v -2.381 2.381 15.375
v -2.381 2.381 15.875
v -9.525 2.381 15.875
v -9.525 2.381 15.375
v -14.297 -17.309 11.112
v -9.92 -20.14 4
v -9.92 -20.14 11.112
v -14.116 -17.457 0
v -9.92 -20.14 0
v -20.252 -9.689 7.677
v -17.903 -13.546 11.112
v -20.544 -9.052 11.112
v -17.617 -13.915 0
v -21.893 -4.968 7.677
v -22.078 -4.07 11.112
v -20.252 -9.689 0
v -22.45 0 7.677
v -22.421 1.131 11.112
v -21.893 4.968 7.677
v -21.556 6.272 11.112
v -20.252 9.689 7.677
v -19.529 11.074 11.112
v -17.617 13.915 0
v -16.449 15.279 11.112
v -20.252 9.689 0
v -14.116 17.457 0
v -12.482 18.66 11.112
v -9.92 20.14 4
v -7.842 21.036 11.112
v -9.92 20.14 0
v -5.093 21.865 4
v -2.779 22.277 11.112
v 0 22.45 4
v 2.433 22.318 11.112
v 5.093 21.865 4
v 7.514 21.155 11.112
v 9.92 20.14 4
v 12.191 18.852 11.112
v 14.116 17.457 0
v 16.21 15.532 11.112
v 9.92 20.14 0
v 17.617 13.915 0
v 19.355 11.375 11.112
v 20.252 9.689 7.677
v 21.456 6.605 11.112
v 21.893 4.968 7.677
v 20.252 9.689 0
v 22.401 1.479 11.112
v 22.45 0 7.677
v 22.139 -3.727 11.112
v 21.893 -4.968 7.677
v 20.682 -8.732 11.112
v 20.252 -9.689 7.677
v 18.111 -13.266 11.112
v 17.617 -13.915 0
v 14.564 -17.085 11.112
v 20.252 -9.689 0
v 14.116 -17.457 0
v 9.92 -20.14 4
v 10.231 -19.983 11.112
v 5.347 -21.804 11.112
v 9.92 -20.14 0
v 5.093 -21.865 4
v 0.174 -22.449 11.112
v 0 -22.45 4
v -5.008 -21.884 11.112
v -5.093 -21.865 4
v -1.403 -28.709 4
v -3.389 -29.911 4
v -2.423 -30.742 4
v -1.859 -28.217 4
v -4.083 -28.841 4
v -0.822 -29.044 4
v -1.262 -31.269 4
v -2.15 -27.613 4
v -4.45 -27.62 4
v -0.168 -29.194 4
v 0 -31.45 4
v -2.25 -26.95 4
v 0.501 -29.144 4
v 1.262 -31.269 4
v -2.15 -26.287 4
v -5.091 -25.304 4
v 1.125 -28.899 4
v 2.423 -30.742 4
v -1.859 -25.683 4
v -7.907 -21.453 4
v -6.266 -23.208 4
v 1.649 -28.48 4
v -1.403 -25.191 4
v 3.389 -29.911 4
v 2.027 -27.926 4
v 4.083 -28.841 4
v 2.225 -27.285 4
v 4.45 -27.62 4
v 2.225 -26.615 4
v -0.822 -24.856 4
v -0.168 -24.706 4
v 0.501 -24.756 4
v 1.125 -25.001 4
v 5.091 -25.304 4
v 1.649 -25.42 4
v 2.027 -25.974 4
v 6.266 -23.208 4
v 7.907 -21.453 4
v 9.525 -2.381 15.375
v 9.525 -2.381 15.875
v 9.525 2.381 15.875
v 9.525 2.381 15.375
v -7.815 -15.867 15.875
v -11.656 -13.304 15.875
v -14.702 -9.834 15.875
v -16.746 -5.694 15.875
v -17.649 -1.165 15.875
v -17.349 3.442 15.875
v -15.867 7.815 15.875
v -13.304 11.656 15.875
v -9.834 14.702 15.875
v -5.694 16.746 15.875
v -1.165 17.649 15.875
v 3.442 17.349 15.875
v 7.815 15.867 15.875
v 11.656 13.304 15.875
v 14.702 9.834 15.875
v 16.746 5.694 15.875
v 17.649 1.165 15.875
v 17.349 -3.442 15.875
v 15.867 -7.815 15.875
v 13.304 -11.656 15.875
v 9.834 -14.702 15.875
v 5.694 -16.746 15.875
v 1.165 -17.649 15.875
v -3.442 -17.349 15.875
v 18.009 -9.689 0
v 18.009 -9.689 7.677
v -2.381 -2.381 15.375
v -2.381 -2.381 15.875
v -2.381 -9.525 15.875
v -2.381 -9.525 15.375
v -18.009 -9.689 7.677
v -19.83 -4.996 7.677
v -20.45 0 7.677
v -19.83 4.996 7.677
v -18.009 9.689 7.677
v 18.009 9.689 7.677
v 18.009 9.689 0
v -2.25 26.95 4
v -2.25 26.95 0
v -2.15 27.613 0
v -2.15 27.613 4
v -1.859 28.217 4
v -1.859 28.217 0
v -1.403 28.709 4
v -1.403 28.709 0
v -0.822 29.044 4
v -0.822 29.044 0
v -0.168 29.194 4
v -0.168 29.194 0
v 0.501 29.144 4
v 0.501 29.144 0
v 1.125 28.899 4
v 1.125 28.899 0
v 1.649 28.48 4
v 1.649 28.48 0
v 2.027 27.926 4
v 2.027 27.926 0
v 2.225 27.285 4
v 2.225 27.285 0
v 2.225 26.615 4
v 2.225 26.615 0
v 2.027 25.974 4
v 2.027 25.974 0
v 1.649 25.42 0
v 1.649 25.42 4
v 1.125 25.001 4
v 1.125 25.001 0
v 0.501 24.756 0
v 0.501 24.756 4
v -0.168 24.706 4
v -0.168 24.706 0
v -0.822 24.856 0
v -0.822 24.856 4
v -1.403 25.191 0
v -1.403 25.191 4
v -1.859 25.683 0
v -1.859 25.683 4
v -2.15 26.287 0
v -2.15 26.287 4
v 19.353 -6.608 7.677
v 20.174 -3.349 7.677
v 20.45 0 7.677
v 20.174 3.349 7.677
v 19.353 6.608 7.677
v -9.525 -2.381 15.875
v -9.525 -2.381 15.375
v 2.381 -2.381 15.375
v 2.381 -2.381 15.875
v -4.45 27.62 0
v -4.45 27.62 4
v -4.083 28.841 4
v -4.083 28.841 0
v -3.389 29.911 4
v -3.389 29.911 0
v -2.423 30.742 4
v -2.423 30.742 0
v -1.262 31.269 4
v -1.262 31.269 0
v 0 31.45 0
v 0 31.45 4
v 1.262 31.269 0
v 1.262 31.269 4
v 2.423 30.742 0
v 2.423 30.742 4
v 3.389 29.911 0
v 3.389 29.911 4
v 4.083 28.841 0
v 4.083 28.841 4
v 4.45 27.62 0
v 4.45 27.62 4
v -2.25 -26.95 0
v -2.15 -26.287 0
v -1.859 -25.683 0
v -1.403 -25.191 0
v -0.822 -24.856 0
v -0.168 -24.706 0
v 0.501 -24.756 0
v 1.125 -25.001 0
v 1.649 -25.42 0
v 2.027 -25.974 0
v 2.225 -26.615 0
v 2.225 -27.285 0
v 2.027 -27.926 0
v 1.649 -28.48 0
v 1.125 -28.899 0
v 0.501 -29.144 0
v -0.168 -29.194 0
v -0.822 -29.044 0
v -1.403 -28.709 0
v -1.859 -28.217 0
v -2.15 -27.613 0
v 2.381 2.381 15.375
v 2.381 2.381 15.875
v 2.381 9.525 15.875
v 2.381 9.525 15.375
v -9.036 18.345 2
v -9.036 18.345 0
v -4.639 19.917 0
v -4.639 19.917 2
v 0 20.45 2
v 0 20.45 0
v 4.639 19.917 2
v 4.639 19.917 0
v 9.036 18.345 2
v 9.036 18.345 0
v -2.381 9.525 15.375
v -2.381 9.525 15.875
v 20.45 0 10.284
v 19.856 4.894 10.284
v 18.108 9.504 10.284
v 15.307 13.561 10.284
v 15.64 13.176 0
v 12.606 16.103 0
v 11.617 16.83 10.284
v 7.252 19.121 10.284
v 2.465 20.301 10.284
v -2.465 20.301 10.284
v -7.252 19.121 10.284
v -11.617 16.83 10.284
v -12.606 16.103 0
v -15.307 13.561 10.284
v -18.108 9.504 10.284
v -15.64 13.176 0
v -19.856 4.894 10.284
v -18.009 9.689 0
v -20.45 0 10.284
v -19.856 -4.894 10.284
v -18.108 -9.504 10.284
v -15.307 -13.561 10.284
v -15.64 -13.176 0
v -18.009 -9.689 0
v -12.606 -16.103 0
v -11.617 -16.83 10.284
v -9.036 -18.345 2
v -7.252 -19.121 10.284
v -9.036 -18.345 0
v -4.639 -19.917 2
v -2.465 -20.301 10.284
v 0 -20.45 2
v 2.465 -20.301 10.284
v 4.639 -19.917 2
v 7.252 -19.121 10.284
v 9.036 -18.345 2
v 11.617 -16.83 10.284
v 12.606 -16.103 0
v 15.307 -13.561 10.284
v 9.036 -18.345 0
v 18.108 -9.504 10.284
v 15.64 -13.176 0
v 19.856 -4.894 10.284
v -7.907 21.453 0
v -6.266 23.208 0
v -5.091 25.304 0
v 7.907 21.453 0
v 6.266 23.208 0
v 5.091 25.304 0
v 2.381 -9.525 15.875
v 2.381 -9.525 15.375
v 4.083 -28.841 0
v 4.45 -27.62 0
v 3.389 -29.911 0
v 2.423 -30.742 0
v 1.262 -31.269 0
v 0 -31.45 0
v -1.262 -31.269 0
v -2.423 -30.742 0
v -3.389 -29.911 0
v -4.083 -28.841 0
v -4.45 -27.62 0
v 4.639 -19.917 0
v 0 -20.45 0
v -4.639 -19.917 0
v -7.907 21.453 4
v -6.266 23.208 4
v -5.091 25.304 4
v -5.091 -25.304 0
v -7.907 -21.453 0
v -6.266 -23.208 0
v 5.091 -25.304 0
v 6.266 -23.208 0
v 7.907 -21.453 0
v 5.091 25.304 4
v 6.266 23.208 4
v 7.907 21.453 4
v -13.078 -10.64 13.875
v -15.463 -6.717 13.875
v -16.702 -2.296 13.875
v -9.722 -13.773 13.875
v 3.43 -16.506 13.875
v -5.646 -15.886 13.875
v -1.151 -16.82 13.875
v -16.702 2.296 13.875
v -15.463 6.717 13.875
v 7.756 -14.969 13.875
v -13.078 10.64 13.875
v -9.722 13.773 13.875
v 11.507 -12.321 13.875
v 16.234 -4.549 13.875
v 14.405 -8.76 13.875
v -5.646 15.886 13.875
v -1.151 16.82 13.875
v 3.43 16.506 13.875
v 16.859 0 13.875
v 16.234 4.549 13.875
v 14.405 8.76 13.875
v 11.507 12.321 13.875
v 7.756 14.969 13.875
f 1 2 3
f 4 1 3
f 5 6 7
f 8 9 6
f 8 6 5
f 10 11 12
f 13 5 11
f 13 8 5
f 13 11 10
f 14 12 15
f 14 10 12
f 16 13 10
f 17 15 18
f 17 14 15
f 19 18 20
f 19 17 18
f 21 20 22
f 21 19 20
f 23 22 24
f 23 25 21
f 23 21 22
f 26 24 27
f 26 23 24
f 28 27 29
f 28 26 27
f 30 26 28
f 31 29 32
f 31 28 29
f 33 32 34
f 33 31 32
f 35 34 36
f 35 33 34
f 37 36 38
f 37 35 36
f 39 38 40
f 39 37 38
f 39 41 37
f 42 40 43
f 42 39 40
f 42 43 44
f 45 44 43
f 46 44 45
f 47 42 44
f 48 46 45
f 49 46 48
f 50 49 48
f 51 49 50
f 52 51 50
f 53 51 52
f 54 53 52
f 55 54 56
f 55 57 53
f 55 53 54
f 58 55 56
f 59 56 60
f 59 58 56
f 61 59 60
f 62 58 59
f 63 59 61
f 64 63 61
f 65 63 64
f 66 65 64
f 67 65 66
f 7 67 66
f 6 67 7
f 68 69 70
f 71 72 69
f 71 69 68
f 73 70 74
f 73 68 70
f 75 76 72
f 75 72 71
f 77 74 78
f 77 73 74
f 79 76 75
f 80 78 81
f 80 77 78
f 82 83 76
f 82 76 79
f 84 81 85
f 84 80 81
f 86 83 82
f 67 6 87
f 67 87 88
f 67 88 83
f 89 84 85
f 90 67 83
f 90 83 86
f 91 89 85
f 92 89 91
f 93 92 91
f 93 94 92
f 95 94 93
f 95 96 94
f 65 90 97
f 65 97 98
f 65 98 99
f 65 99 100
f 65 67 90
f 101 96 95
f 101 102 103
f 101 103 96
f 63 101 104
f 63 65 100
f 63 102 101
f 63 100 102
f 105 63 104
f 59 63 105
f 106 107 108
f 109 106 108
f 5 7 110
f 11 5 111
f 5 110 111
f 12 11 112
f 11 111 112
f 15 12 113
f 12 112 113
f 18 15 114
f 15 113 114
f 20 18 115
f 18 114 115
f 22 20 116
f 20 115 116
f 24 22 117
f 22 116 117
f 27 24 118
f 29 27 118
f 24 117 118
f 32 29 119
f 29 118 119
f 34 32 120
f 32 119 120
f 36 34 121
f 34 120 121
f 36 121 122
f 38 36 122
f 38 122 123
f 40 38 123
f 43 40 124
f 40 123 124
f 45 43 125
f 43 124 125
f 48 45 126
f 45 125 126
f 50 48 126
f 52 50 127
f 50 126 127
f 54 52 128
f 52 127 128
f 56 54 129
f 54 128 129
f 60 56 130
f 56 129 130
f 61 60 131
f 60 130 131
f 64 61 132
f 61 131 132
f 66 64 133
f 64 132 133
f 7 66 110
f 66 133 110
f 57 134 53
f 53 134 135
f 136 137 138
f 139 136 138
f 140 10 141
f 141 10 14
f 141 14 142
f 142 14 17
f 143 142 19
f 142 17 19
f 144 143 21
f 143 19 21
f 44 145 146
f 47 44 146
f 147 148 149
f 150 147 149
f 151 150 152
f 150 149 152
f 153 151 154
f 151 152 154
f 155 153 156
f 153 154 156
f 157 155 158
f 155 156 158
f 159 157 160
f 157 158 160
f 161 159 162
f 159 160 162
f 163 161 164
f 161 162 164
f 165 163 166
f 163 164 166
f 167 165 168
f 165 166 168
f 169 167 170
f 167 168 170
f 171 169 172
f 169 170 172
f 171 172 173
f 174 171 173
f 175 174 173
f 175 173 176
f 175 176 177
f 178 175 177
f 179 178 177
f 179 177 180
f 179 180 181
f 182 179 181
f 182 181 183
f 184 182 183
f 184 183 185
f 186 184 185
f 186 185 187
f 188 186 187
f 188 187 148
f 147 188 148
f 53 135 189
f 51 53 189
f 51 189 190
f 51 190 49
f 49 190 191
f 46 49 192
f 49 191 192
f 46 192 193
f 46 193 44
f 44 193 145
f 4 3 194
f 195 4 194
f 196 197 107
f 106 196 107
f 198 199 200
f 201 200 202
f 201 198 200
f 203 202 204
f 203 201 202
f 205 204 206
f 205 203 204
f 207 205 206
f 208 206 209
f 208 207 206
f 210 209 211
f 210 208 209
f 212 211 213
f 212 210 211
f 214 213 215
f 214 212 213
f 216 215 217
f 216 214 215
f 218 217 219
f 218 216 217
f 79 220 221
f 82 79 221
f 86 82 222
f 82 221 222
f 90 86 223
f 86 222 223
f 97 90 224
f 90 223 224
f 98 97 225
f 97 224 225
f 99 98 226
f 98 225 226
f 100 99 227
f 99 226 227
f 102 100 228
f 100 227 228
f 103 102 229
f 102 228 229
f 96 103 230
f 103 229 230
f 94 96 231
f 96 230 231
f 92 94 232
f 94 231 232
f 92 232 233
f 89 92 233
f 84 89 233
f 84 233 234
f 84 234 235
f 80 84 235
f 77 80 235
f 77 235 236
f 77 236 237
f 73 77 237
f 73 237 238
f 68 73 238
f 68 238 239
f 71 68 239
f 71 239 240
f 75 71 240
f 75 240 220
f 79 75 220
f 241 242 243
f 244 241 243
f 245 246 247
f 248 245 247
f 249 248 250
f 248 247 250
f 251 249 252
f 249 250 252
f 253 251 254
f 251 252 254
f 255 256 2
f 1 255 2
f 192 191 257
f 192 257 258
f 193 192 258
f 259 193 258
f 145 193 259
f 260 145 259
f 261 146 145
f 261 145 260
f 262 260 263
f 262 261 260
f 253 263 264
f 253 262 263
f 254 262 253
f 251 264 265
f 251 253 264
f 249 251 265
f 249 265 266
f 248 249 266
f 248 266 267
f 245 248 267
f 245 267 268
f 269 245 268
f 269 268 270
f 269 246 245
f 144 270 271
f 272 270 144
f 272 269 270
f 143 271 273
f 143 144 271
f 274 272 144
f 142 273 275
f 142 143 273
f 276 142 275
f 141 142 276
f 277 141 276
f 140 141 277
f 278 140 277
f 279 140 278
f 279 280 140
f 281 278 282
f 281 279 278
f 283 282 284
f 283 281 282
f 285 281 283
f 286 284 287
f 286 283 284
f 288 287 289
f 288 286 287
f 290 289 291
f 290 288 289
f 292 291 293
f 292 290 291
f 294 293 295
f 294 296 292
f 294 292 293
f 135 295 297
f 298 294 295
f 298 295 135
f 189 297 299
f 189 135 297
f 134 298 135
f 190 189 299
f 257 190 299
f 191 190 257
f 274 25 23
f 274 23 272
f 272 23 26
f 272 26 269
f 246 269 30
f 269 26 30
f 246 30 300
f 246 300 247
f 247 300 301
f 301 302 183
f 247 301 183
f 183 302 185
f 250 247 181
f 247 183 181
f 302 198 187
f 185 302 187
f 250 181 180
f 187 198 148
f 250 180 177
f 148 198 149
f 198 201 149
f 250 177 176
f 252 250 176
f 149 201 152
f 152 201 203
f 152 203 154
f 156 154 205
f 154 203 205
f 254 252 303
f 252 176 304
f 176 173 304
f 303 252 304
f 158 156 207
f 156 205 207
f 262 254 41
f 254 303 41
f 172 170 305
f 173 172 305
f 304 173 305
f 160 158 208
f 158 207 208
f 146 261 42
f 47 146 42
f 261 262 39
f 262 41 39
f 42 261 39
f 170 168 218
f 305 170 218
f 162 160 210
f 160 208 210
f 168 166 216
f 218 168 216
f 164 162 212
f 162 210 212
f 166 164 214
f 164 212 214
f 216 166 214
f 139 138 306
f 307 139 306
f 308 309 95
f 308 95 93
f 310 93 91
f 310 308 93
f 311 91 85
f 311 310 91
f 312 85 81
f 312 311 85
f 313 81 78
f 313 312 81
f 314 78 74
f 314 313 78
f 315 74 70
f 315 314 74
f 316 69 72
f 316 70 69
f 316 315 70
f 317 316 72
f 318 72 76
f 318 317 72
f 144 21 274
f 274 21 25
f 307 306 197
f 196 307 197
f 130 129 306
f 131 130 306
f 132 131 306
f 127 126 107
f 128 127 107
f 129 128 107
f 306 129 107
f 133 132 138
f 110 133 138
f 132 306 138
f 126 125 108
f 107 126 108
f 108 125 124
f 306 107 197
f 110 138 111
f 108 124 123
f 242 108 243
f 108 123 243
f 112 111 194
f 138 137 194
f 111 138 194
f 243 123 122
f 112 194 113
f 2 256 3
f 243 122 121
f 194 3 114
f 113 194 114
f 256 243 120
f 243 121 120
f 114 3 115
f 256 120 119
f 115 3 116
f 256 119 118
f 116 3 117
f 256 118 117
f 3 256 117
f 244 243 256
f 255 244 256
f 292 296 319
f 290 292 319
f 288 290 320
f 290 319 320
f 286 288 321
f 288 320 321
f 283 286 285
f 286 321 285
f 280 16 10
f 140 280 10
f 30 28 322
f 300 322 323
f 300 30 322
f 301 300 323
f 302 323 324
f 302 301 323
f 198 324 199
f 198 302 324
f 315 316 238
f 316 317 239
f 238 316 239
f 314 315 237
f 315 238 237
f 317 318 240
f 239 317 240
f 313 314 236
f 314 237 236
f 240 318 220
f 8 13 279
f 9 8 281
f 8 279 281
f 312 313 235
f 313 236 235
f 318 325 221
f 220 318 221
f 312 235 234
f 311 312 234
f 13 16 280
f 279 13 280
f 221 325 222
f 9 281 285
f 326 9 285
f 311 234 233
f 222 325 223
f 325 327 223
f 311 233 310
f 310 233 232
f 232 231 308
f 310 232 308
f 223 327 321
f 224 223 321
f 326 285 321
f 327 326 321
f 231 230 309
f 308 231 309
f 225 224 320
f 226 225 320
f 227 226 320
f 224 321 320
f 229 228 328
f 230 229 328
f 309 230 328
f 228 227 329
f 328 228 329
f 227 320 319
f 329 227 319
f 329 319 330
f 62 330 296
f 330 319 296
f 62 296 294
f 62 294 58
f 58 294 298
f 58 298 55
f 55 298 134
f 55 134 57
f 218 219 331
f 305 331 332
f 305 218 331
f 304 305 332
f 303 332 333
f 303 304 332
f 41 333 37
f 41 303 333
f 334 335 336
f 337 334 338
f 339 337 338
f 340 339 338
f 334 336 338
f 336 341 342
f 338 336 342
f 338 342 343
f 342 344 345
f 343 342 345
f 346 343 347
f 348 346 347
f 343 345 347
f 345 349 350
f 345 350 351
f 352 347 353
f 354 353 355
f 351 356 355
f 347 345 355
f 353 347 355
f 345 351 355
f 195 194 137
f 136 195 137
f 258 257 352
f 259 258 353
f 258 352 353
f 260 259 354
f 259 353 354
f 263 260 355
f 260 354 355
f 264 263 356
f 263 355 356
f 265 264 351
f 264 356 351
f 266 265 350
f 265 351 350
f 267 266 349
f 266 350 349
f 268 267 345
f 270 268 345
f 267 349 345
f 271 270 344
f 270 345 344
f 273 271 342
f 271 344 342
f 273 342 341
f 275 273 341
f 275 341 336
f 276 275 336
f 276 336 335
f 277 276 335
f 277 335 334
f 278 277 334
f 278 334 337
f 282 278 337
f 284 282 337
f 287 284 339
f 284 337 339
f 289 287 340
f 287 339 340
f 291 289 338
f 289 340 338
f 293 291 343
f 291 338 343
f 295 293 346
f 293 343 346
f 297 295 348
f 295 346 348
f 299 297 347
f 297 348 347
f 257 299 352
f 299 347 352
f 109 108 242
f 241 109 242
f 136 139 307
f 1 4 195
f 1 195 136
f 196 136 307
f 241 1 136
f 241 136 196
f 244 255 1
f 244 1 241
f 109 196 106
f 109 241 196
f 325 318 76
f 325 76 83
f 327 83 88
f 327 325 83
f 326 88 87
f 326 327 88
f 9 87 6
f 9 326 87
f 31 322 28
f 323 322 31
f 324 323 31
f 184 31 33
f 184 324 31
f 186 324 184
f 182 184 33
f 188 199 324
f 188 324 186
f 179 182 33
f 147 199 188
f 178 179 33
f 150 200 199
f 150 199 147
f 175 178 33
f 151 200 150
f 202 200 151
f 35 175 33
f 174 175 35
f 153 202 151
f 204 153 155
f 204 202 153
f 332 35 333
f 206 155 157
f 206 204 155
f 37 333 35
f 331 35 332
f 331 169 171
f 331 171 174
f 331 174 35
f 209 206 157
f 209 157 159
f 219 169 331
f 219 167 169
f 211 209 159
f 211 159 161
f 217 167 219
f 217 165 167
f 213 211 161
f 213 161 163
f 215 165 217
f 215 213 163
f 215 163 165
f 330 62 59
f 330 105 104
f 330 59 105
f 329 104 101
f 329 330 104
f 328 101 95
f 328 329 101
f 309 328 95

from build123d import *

# Parameters (mm, degrees)
SKETCH1_R               = 20.450000000000003
BOSS_EXTRUDE1_DEPTH     = 15.875
CUT_EXTRUDE2_START      = -11.875
CUT_EXTRUDE2_DEPTH      = 11.875
M4_CLEARANCE_HOLE1_D    = 4.5
CHAMFER1_SIZE           = 4.7625
SHELL1_OUTLINE_R        = 20.45
SHELL1_DEPTH            = 10.284072775
SHELL1_2_DEPTH          = 2
BOSS_EXTRUDE2_START     = 2
BOSS_EXTRUDE2_DEPTH     = 2
CUT_EXTRUDE5_DEPTH      = 0.5
CUT_EXTRUDE7_DEPTH      = 42.774640932046694
CUT_EXTRUDE7_DEPTH_BACK = 42.774640932046694


with BuildPart() as part:
    # Sketch1 → Boss-Extrude1 (new body)
    # profile 1 of 2: a face of its own
    with BuildSketch(Plane.XY):
        with BuildLine():
            ThreePointArc((-4.449768205772106, -27.620494530122933), (-6.26579346059064, -23.208178662106004), (-9.919608253272203, -20.139609532026952))
            ThreePointArc((-9.919608253272203, -20.139609532026952), (-22.449999999999612, -2.260939e-11), (-9.919608253272486, 20.139609531981904))
            ThreePointArc((-9.919608253272486, 20.139609531981904), (-6.265793460590954, 23.208178662061), (-4.449768205772483, 27.620494530077963))
            ThreePointArc((-4.449768205772483, 27.620494530077963), (1.6339e-13, 31.449999999977553), (4.449768205772869, 27.620494530078034))
            ThreePointArc((4.449768205772869, 27.620494530078034), (6.265793460591407, 23.2081786620611), (9.919608253272981, 20.139609531982046))
            ThreePointArc((9.919608253272981, 20.139609531982046), (22.4500000000004, -2.229809e-11), (9.919608253273257, -20.13960953202682))
            ThreePointArc((9.919608253273257, -20.13960953202682), (6.265793460591725, -23.20817866210592), (4.449768205773249, -27.620494530122876))
            ThreePointArc((4.449768205773249, -27.620494530122876), (5.9636e-13, -31.450000000022463), (-4.449768205772106, -27.620494530122933))
        make_face()
        Circle(SKETCH1_R, mode=Mode.SUBTRACT)
    # profile 2 of 2: a face of its own
    with BuildSketch(Plane.XY):
        Circle(SKETCH1_R)
    extrude(amount=BOSS_EXTRUDE1_DEPTH)

    # Sketch3 → Cut-Extrude2 (cut)
    with BuildSketch(Plane.XY.offset(15.875).offset(CUT_EXTRUDE2_START)):
        with BuildLine():
            ThreePointArc((-9.919608253272486, 20.139609531981908), (2.3162e-13, 22.449999999977553), (9.919608253272981, 20.13960953198205))
            ThreePointArc((9.91960825327298, 20.139609531982046), (6.2657934605914, 23.208178662061094), (4.4497682057728625, 27.620494530078037))
            ThreePointArc((4.4497682057728625, 27.620494530078037), (1.6065e-13, 31.449999999977546), (-4.449768205772477, 27.620494530077963))
            ThreePointArc((-4.449768205772479, 27.620494530077963), (-6.265793460590951, 23.208178662061), (-9.919608253272482, 20.139609531981904))
        make_face()
        with BuildLine():
            ThreePointArc((4.449768205773246, -27.62049453012288), (6.265793460591725, -23.20817866210592), (9.919608253273257, -20.13960953202682))
            ThreePointArc((9.919608253273244, -20.139609532026824), (5.4515e-13, -22.45000000002246), (-9.919608253272205, -20.139609532026956))
            ThreePointArc((-9.9196082532722, -20.139609532026952), (-6.265793460590633, -23.208178662106), (-4.449768205772095, -27.620494530122933))
            ThreePointArc((-4.4497682057720995, -27.620494530122933), (5.9608e-13, -31.450000000022456), (4.449768205773246, -27.62049453012288))
        make_face()
    extrude(amount=CUT_EXTRUDE2_DEPTH, mode=Mode.SUBTRACT)

    # M4 Clearance Hole1 (through all)
    with Locations(Plane.XY.offset(4)):
        with Locations((0, -26.95), (0, 26.95)):
            Hole(M4_CLEARANCE_HOLE1_D / 2)

    # Chamfer1
    chamfer1_edges = [part.edges().sort_by_distance(p)[0] for p in [
        (9.91960825327299, 20.139609531982046, 15.875),
    ]]
    chamfer(chamfer1_edges, length=CHAMFER1_SIZE)

    # Shell1: read off the stored shape, not the designer's step
    # Shell1 outline → Shell1 (cut)
    with BuildSketch(Plane.XY):
        Circle(SHELL1_OUTLINE_R)
    extrude(amount=SHELL1_DEPTH, mode=Mode.SUBTRACT)

    # Shell1 2 outline → Shell1 2 (cut)
    with BuildSketch(Plane.XY):
        with BuildLine():
            ThreePointArc((9.035901505, -18.345434963), (0, -20.45), (-9.035901505, -18.345434963))
            ThreePointArc((-9.035901505, -18.345434963), (-5.656595992, -20.826114024), (-3.336769132, -24.317800965))
            ThreePointArc((-3.336769132, -24.317800965), (0, -22.7), (3.336769132, -24.317800965))
            ThreePointArc((3.336769132, -24.317800965), (5.656595992, -20.826114024), (9.035901505, -18.345434963))
        make_face()
        with BuildLine():
            ThreePointArc((-3.336769132, 24.317800965), (-5.656595992, 20.826114024), (-9.035901505, 18.345434963))
            ThreePointArc((-9.035901505, 18.345434963), (0, 20.45), (9.035901505, 18.345434963))
            ThreePointArc((9.035901505, 18.345434963), (5.656595992, 20.826114024), (3.336769132, 24.317800965))
            ThreePointArc((3.336769132, 24.317800965), (0, 22.7), (-3.336769132, 24.317800965))
        make_face()
    extrude(amount=SHELL1_2_DEPTH, mode=Mode.SUBTRACT)

    # Shell1 3 outline → Shell1 3 (revolve, cut)
    with BuildSketch(Plane.XZ):
        Polygon((16.859072875, 13.875), (0, 13.875), (0, 10.284072775), (20.45, 10.284072775), align=None)
    revolve(axis=Axis((0, 0, 0), (0, 0, 1)), mode=Mode.SUBTRACT)

    # Sketch6 → Boss-Extrude2 (add)
    with BuildSketch(Plane(origin=(0, 0, 2), x_dir=(-1, 0, 0), z_dir=(0, 0, -1)).offset(BOSS_EXTRUDE2_START)):
        with BuildLine():
            ThreePointArc((9.035901504651038, -18.34543496347422), (5.656595991725949, -20.826114024149227), (3.3367691319005477, -24.3178009648972))
            ThreePointArc((3.3367691319005477, -24.3178009648972), (-5.6684e-13, -22.70000000000008), (-3.3367691319011485, -24.317800964898304))
            ThreePointArc((-3.3367691319011485, -24.317800964898304), (-5.656595991726578, -20.826114024149597), (-9.035901504652076, -18.345434963474087))
            ThreePointArc((-9.035901504652076, -18.345434963474087), (-5.3382e-13, -20.45000000002246), (9.035901504651038, -18.34543496347422))
        make_face()
        with BuildLine():
            ThreePointArc((-9.035901504651829, 18.345434963429298), (-5.65659599172108, 20.826114024110222), (-3.336769131894781, 24.31780096486728))
            ThreePointArc((-3.336769131894781, 24.31780096486728), (-2.2525e-13, 22.699999999977557), (3.336769131894348, 24.317800964867242))
            ThreePointArc((3.336769131894348, 24.317800964867242), (5.656595991720593, 20.826114024110154), (9.03590150465129, 18.345434963429177))
            ThreePointArc((9.03590150465129, 18.345434963429177), (-2.5229e-13, 20.449999999977546), (-9.035901504651829, 18.345434963429298))
        make_face()
    extrude(amount=-BOSS_EXTRUDE2_DEPTH)

    # Sketch7 → Cut-Extrude5 (cut)
    with BuildSketch(Plane.XY.offset(15.875)):
        Polygon((-2.381250000000002, 9.524999999999997), (-2.381250000000001, 2.3812500000000005), (2.3812499999999996, 2.3812500000000005), (2.3812499999999983, 9.524999999999997), align=None)
        Polygon((2.3812499999999996, 2.3812500000000005), (-2.3812500000000014, 2.3812500000000005), (-2.3812500000000005, -2.3812499999999996), (2.3812499999999996, -2.3812499999999996), align=None)
        Polygon((9.525, 2.3812500000000005), (2.3812499999999996, 2.3812500000000005), (2.381249999999999, -2.3812499999999996), (9.525, -2.3812499999999996), align=None)
        Polygon((-2.3812500000000014, 2.3812500000000005), (-9.525, 2.3812500000000005), (-9.525, -2.3812500000000005), (-2.3812500000000005, -2.38125), align=None)
        Polygon((2.3812499999999996, -2.3812499999999996), (-2.3812500000000005, -2.38125), (-2.3812499999999996, -9.525000000000004), (2.3812499999999996, -9.525000000000004), align=None)
    extrude(amount=-CUT_EXTRUDE5_DEPTH, mode=Mode.SUBTRACT)

    # Sketch9 → Cut-Extrude7 (cut, two sides: drawn at the far end of the back side and taken through both)
    # profile 1 of 3: a face of its own
    with BuildSketch(Plane(origin=(0, 0, 0), x_dir=(0, 0, -1), z_dir=(1, 0, 0)).offset(-CUT_EXTRUDE7_DEPTH_BACK)):
        Polygon((-1.5018000000013485, 9.688999997177131), (-1.5018000000013485, -9.68900000282286), (-7.676800000001349, -9.689000002822862), (-7.676800000001349, 9.688999997177131), align=None)
        Polygon((-3.0018000000013485, 8.188999997177131), (-6.176800000001349, 8.188999997177124), (-6.176800000001349, -8.189000002822862), (-3.0018000000013485, -8.189000002822862), align=None, mode=Mode.SUBTRACT)
    # profile 2 of 3: a face of its own
    with BuildSketch(Plane(origin=(0, 0, 0), x_dir=(0, 0, -1), z_dir=(1, 0, 0)).offset(-CUT_EXTRUDE7_DEPTH_BACK)):
        Polygon((0, -9.68900000282286), (-1.5018000000013485, -9.68900000282286), (-1.5018000000013485, 9.688999997177131), (0, 9.68899999717713), align=None)
    # profile 3 of 3: a face of its own
    with BuildSketch(Plane(origin=(0, 0, 0), x_dir=(0, 0, -1), z_dir=(1, 0, 0)).offset(-CUT_EXTRUDE7_DEPTH_BACK)):
        Polygon((-3.0018000000013485, 8.188999997177131), (-3.0018000000013485, -8.189000002822862), (-6.176800000001349, -8.189000002822862), (-6.176800000001349, 8.188999997177124), align=None)
    extrude(amount=CUT_EXTRUDE7_DEPTH + CUT_EXTRUDE7_DEPTH_BACK, mode=Mode.SUBTRACT)


solid = part.part
